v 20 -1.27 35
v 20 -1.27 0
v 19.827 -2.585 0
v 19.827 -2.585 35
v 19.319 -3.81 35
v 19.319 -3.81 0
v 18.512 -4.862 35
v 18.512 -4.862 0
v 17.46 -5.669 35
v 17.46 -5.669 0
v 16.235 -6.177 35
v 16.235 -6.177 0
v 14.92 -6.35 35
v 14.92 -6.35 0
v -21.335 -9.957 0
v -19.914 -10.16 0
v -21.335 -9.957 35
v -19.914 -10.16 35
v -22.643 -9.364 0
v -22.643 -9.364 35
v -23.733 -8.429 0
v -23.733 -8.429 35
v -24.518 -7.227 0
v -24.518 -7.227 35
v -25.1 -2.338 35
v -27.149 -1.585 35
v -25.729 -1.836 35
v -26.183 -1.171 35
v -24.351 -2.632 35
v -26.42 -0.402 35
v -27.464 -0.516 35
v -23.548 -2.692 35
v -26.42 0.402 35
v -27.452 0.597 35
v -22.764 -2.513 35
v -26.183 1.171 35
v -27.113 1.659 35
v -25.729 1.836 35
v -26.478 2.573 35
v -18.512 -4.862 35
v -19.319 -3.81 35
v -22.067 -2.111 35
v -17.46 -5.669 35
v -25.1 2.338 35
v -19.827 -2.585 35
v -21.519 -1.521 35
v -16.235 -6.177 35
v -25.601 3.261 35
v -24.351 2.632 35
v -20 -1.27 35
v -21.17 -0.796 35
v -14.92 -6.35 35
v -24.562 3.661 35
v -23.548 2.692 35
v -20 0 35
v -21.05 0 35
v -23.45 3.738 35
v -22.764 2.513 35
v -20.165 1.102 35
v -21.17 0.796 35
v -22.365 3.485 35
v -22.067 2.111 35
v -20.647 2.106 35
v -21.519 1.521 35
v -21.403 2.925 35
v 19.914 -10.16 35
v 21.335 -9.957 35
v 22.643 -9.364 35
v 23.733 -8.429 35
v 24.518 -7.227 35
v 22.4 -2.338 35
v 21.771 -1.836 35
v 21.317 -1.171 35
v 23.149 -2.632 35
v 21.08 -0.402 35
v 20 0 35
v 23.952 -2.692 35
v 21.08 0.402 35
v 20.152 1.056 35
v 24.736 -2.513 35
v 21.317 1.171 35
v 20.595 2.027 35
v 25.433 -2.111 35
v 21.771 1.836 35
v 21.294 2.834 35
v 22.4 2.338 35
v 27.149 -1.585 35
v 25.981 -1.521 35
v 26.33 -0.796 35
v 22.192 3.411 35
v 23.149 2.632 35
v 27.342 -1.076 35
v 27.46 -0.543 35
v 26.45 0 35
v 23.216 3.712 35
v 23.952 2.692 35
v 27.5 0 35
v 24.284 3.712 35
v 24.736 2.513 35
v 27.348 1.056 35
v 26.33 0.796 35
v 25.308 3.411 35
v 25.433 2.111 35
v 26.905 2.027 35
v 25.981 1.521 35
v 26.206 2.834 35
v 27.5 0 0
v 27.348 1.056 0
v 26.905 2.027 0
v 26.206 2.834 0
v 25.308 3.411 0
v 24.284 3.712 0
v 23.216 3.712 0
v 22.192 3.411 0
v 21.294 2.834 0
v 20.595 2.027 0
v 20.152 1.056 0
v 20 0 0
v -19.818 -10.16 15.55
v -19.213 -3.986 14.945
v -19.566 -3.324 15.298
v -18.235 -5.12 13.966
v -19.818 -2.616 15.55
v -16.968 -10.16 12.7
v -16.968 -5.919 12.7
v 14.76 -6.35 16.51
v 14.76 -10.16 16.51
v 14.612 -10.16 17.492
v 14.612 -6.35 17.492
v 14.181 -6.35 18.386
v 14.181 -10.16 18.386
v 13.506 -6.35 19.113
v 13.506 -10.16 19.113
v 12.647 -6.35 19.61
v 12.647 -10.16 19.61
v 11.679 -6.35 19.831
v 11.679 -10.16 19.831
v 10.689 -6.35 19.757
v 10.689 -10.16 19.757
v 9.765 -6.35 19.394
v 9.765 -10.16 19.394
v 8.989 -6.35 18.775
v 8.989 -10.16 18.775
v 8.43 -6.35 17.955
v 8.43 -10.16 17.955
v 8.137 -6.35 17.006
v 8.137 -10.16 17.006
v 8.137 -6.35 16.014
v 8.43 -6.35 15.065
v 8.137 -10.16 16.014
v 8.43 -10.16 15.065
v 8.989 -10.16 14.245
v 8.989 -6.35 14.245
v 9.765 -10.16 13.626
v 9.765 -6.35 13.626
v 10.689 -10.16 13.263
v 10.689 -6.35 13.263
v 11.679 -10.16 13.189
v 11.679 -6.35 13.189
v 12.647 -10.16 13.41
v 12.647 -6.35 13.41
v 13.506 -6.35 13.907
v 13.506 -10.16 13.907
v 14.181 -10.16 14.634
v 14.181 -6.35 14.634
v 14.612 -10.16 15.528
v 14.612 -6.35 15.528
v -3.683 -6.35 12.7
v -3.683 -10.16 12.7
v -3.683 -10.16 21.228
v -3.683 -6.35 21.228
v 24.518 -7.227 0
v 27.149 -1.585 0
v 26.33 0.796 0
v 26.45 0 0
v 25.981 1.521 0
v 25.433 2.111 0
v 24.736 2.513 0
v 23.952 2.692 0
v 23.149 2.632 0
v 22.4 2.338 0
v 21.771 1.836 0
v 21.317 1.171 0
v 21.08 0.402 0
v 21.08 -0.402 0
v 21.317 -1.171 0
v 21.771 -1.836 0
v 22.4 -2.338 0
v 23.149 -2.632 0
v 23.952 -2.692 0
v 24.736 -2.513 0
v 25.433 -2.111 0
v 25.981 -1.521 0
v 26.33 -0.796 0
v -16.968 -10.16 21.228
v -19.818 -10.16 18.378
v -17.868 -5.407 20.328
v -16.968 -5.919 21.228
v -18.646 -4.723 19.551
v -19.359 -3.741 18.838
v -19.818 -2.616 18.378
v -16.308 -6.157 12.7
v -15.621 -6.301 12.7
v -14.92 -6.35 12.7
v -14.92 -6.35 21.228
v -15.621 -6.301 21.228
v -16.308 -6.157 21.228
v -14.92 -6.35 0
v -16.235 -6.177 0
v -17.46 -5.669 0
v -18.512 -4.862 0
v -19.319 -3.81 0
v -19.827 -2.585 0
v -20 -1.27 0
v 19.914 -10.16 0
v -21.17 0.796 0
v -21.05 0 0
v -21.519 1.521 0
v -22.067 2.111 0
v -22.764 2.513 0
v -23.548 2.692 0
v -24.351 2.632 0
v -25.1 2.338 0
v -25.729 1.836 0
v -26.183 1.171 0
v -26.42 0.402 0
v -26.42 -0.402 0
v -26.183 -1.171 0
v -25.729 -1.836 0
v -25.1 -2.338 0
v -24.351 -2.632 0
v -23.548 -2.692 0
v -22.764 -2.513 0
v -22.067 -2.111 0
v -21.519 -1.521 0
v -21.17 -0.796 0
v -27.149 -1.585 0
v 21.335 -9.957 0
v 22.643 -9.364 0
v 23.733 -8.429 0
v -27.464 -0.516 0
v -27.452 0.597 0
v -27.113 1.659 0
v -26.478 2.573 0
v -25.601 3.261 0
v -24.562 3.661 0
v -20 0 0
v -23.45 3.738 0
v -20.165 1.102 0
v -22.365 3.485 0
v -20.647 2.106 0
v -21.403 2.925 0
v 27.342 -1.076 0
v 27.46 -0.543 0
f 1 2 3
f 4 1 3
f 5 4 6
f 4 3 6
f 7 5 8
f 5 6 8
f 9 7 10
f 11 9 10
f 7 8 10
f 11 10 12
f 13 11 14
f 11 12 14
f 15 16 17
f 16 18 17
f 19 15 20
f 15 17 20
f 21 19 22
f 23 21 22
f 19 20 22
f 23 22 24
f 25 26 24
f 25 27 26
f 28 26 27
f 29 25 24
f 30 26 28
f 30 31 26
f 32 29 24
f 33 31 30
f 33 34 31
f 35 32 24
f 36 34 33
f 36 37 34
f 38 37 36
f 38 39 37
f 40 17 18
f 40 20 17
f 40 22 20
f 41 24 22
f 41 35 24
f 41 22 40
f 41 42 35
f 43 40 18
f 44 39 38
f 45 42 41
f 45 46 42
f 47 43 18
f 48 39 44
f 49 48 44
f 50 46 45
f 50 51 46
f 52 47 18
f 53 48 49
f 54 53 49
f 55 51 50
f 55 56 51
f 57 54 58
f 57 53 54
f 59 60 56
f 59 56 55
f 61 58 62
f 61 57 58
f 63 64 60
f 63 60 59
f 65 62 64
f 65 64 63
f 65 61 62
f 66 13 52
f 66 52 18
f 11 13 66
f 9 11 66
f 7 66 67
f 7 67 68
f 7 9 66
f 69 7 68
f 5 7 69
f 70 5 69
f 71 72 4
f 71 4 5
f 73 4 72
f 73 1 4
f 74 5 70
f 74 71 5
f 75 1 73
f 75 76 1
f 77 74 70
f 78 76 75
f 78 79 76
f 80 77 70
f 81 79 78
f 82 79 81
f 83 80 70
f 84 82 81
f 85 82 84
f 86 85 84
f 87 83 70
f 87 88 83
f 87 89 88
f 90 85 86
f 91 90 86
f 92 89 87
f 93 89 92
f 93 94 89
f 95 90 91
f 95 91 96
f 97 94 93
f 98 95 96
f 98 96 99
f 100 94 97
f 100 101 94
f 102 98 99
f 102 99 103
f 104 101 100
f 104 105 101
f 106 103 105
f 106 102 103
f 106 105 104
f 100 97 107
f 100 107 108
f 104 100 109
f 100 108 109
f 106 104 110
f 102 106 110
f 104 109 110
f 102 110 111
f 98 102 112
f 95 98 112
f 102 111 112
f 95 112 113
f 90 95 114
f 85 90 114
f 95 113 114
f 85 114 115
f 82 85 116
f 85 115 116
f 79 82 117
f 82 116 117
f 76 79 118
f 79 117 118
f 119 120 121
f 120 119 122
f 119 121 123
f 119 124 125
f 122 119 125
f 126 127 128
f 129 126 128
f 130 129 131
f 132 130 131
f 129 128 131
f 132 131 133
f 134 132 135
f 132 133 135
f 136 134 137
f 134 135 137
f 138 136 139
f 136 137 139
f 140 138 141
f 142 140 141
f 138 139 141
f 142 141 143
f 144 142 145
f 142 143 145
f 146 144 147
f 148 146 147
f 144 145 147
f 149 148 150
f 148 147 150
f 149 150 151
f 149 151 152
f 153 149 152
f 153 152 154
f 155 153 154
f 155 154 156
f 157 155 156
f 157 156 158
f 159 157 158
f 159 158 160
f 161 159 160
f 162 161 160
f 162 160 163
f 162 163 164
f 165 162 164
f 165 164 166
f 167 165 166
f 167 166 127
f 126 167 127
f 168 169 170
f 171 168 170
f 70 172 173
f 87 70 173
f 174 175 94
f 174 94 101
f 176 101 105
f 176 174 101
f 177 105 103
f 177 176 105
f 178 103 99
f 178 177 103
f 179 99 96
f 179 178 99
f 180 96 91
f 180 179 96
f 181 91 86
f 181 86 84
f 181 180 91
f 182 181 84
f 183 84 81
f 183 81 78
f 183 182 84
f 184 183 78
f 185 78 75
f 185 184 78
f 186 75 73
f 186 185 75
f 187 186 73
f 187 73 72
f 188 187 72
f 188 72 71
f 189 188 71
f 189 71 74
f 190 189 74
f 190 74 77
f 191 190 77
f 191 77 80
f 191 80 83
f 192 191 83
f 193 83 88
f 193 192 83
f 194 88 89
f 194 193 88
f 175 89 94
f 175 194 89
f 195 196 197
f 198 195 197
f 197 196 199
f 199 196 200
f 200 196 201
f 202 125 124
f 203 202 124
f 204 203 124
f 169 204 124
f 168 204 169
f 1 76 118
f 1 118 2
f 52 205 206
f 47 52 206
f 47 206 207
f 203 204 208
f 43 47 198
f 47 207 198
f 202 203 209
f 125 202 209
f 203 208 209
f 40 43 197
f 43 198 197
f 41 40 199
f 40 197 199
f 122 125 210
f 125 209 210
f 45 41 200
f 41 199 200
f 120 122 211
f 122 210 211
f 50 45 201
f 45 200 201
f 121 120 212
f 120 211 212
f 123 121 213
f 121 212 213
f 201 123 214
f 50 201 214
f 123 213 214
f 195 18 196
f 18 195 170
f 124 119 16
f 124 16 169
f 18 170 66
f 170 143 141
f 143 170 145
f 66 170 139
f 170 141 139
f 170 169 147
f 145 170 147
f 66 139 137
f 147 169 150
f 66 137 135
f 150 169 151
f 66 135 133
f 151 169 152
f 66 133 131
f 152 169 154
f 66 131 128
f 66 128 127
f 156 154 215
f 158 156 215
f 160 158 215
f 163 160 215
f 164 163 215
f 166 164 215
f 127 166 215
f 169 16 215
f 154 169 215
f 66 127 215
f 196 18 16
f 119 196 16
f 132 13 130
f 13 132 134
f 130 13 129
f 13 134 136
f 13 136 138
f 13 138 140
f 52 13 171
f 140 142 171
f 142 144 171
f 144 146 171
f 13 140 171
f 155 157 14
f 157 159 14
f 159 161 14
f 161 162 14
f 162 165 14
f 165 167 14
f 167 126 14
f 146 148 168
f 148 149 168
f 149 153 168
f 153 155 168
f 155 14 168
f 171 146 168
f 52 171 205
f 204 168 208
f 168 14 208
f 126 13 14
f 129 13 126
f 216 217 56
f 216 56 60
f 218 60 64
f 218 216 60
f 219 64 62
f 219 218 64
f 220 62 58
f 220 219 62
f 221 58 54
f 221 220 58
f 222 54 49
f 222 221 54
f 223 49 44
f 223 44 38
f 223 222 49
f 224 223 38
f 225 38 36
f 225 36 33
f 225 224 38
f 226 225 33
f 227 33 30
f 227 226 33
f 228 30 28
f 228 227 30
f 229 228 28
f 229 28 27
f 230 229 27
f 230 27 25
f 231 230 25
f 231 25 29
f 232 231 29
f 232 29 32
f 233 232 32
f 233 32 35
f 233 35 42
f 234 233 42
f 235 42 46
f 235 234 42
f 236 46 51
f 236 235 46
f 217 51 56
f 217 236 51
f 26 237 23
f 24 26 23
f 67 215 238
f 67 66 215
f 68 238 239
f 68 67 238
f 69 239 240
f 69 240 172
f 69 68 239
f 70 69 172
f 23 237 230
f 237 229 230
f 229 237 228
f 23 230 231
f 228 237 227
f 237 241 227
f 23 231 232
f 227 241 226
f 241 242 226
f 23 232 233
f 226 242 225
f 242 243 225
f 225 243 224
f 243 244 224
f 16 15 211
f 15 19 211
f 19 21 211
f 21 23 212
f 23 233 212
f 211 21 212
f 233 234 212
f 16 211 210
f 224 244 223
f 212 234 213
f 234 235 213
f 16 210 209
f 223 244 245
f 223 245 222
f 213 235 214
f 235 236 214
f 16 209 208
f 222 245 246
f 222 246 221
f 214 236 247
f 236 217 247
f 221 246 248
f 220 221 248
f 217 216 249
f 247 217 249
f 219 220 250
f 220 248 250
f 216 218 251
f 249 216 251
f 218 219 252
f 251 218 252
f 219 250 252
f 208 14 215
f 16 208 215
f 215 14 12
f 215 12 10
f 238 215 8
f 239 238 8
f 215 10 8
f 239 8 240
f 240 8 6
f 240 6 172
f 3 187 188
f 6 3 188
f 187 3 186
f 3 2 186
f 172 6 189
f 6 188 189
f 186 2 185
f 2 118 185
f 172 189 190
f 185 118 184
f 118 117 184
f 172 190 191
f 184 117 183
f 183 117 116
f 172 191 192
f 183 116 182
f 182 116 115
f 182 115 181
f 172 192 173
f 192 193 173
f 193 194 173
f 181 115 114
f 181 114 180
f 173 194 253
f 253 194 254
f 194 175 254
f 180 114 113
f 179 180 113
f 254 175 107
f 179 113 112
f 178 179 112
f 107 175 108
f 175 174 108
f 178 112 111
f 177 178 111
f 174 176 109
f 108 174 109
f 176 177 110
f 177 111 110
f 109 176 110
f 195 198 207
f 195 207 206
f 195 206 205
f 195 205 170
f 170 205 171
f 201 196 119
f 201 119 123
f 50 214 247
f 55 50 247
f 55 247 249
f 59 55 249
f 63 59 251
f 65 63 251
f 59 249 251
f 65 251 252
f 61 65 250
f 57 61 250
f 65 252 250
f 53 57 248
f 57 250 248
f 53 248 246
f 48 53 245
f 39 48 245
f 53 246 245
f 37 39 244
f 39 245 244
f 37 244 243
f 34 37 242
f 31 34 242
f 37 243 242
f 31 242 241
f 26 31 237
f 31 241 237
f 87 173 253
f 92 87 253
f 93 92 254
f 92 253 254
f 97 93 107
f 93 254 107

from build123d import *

# Parameters (mm, degrees)
F0_R         = 2.7
F1_DEPTH     = 35
F2_R         = 3.33
F3_DEPTH     = 13.911
F4_T1_DEPTH  = 35
F4_T6_DEPTH  = 47.7
F4_T11_DEPTH = 60.4
F4_T17_DEPTH = 47.7
F4_T23_DEPTH = 47.7
F4_T28_DEPTH = 60.4
F5_R         = 5.08


# Not quite as in the source:
# - a fillet or chamfer that OpenCascade refuses, or shapes differently, is made with other operations: its cross-section is extruded or revolved along the edge and cut away or added


with BuildPart() as f1:
    # F0 (on Top) → F1 (new body)
    with BuildSketch(Plane.XY):
        with BuildLine():
            Line((-20, -6.35), (-20, 0))
            ThreePointArc((-20, 0), (-22.9383514477, -3.6611100267), (-27.1486542014, -1.5848184815))
            Line((-27.1486542014, -1.5848184815), (-23.1499813893, -10.16))
            Line((-23.1499813893, -10.16), (23.1499813893, -10.16))
            Line((23.1499813893, -10.16), (27.1486542014, -1.5848184815))
            ThreePointArc((27.1486542014, -1.5848184815), (22.9383514477, -3.6611100267), (20, 0))
            Line((20, 0), (20, -6.35))
            Line((20, -6.35), (-20, -6.35))
        make_face()
        with BuildLine():
            ThreePointArc((-27.1486542014, -1.5848184815), (-22.9383514477, -3.6611100267), (-20, 0))
            ThreePointArc((-20, 0), (-24.5616485523, 3.6611100267), (-27.1486542014, -1.5848184815))
        make_face()
        with Locations((-23.75, 0)):
            Circle(F0_R, mode=Mode.SUBTRACT)
        with BuildLine():
            ThreePointArc((27.5, 0), (23.75, 3.75), (20, 0))
            ThreePointArc((20, 0), (22.9383514477, -3.6611100267), (27.1486542014, -1.5848184815))
            ThreePointArc((27.1486542014, -1.5848184815), (27.4111100267, -0.8116485523), (27.5, 0))
        make_face()
        with Locations((23.75, 0)):
            Circle(F0_R, mode=Mode.SUBTRACT)
    extrude(amount=F1_DEPTH)

    # F2 (on face) → F3 (cut, through all)
    with BuildSketch(Plane.XZ.offset(10.16)):
        Polygon((-3.683, 12.7), (-3.683, 21.228), (-16.9683, 21.228), (-19.8183, 18.378), (-19.8183, 15.55), (-16.9683, 12.7), align=None)
        with Locations((11.43, 16.51)):
            Circle(F2_R)
    extrude(amount=-F3_DEPTH, mode=Mode.SUBTRACT)

    # F4: fillet of radius 5.08 on 2 edges, made by hand

    # F4_s2 → F4_t1 (join)
    with BuildSketch(Plane.XY):
        with BuildLine():
            ThreePointArc((20, -1.27), (18.5121024484, -4.8621024484), (14.92, -6.35))
            Line((14.92, -6.35), (20, -6.35))
            Line((20, -6.35), (20, -1.27))
        make_face()
    extrude(amount=F4_T1_DEPTH)


with BuildPart() as f4_tool4:
    # F4_s5 → F4_t6 (new body)
    with BuildSketch(Plane.XY):
        with BuildLine():
            ThreePointArc((-14.92, -6.35), (-18.5121024484, -4.8621024484), (-20, -1.27))
            Line((-20, -1.27), (-20, -6.35))
            Line((-20, -6.35), (-14.92, -6.35))
        make_face()
    extrude(amount=F4_T6_DEPTH)

    split(bisect_by=Plane(origin=(-2.13415, 0, -2.13415), x_dir=(0, 1, 0), z_dir=(-0.7071067812, 0, -0.7071067812)), keep=Keep.TOP)


with BuildPart() as f1_1:
    add(f1.part)

    # F4_t3: union F4_tool4
    add(f4_tool4.part)


with BuildPart() as f4_tool9:
    # F4_s10 → F4_t11 (new body)
    with BuildSketch(Plane.XY.offset(-12.7)):
        with BuildLine():
            ThreePointArc((-14.92, -6.35), (-18.5121024484, -4.8621024484), (-20, -1.27))
            Line((-20, -1.27), (-20, -6.35))
            Line((-20, -6.35), (-14.92, -6.35))
        make_face()
    extrude(amount=F4_T11_DEPTH)

    split(bisect_by=Plane.XY.offset(12.7), keep=Keep.BOTTOM)

    split(bisect_by=Plane(origin=(-2.13415, 0, -2.13415), x_dir=(0, 1, 0), z_dir=(0.7071067812, 0, 0.7071067812)), keep=Keep.TOP)


with BuildPart() as f1_2:
    add(f1_1.part)

    # F4_t8: union F4_tool9
    add(f4_tool9.part)


with BuildPart() as f4_tool15:
    # F4_s16 → F4_t17 (new body)
    with BuildSketch(Plane.XY.offset(-12.7)):
        with BuildLine():
            ThreePointArc((-14.92, -6.35), (-18.5121024484, -4.8621024484), (-20, -1.27))
            Line((-20, -1.27), (-20, -6.35))
            Line((-20, -6.35), (-14.92, -6.35))
        make_face()
    extrude(amount=F4_T17_DEPTH)

    split(bisect_by=Plane(origin=(-2.13415, 0, -2.13415), x_dir=(0, 1, 0), z_dir=(0.7071067812, 0, 0.7071067812)), keep=Keep.TOP)

    split(bisect_by=Plane.YZ.offset(-19.8183), keep=Keep.BOTTOM)


with BuildPart() as f1_3:
    add(f1_2.part)

    # F4_t14: union F4_tool15
    add(f4_tool15.part)


with BuildPart() as f4_tool21:
    # F4_s22 → F4_t23 (new body)
    with BuildSketch(Plane.XY.offset(-12.7)):
        with BuildLine():
            ThreePointArc((-14.92, -6.35), (-18.5121024484, -4.8621024484), (-20, -1.27))
            Line((-20, -1.27), (-20, -6.35))
            Line((-20, -6.35), (-14.92, -6.35))
        make_face()
    extrude(amount=F4_T23_DEPTH)

    split(bisect_by=Plane(origin=(-19.09815, 0, 19.09815), x_dir=(0, 1, 0), z_dir=(-0.7071067812, 0, 0.7071067812)), keep=Keep.TOP)


with BuildPart() as f1_4:
    add(f1_3.part)

    # F4_t20: union F4_tool21
    add(f4_tool21.part)


with BuildPart() as f4_tool26:
    # F4_s27 → F4_t28 (new body)
    with BuildSketch(Plane.XY.offset(-12.7)):
        with BuildLine():
            ThreePointArc((-14.92, -6.35), (-18.5121024484, -4.8621024484), (-20, -1.27))
            Line((-20, -1.27), (-20, -6.35))
            Line((-20, -6.35), (-14.92, -6.35))
        make_face()
    extrude(amount=F4_T28_DEPTH)

    split(bisect_by=Plane(origin=(-19.09815, 0, 19.09815), x_dir=(0, 1, 0), z_dir=(0.7071067812, 0, -0.7071067812)), keep=Keep.TOP)

    split(bisect_by=Plane.XY.offset(21.228), keep=Keep.TOP)


with BuildPart() as f1_5:
    add(f1_4.part)

    # F4_t25: union F4_tool26
    add(f4_tool26.part)

    # F5
    f5_edges = [f1_5.edges().sort_by_distance(p)[0] for p in [
        (-23.149981, -10.16, 17.5),
        (23.149981, -10.16, 17.5),
    ]]
    fillet(f5_edges, radius=F5_R)


solid = f1_5.part
